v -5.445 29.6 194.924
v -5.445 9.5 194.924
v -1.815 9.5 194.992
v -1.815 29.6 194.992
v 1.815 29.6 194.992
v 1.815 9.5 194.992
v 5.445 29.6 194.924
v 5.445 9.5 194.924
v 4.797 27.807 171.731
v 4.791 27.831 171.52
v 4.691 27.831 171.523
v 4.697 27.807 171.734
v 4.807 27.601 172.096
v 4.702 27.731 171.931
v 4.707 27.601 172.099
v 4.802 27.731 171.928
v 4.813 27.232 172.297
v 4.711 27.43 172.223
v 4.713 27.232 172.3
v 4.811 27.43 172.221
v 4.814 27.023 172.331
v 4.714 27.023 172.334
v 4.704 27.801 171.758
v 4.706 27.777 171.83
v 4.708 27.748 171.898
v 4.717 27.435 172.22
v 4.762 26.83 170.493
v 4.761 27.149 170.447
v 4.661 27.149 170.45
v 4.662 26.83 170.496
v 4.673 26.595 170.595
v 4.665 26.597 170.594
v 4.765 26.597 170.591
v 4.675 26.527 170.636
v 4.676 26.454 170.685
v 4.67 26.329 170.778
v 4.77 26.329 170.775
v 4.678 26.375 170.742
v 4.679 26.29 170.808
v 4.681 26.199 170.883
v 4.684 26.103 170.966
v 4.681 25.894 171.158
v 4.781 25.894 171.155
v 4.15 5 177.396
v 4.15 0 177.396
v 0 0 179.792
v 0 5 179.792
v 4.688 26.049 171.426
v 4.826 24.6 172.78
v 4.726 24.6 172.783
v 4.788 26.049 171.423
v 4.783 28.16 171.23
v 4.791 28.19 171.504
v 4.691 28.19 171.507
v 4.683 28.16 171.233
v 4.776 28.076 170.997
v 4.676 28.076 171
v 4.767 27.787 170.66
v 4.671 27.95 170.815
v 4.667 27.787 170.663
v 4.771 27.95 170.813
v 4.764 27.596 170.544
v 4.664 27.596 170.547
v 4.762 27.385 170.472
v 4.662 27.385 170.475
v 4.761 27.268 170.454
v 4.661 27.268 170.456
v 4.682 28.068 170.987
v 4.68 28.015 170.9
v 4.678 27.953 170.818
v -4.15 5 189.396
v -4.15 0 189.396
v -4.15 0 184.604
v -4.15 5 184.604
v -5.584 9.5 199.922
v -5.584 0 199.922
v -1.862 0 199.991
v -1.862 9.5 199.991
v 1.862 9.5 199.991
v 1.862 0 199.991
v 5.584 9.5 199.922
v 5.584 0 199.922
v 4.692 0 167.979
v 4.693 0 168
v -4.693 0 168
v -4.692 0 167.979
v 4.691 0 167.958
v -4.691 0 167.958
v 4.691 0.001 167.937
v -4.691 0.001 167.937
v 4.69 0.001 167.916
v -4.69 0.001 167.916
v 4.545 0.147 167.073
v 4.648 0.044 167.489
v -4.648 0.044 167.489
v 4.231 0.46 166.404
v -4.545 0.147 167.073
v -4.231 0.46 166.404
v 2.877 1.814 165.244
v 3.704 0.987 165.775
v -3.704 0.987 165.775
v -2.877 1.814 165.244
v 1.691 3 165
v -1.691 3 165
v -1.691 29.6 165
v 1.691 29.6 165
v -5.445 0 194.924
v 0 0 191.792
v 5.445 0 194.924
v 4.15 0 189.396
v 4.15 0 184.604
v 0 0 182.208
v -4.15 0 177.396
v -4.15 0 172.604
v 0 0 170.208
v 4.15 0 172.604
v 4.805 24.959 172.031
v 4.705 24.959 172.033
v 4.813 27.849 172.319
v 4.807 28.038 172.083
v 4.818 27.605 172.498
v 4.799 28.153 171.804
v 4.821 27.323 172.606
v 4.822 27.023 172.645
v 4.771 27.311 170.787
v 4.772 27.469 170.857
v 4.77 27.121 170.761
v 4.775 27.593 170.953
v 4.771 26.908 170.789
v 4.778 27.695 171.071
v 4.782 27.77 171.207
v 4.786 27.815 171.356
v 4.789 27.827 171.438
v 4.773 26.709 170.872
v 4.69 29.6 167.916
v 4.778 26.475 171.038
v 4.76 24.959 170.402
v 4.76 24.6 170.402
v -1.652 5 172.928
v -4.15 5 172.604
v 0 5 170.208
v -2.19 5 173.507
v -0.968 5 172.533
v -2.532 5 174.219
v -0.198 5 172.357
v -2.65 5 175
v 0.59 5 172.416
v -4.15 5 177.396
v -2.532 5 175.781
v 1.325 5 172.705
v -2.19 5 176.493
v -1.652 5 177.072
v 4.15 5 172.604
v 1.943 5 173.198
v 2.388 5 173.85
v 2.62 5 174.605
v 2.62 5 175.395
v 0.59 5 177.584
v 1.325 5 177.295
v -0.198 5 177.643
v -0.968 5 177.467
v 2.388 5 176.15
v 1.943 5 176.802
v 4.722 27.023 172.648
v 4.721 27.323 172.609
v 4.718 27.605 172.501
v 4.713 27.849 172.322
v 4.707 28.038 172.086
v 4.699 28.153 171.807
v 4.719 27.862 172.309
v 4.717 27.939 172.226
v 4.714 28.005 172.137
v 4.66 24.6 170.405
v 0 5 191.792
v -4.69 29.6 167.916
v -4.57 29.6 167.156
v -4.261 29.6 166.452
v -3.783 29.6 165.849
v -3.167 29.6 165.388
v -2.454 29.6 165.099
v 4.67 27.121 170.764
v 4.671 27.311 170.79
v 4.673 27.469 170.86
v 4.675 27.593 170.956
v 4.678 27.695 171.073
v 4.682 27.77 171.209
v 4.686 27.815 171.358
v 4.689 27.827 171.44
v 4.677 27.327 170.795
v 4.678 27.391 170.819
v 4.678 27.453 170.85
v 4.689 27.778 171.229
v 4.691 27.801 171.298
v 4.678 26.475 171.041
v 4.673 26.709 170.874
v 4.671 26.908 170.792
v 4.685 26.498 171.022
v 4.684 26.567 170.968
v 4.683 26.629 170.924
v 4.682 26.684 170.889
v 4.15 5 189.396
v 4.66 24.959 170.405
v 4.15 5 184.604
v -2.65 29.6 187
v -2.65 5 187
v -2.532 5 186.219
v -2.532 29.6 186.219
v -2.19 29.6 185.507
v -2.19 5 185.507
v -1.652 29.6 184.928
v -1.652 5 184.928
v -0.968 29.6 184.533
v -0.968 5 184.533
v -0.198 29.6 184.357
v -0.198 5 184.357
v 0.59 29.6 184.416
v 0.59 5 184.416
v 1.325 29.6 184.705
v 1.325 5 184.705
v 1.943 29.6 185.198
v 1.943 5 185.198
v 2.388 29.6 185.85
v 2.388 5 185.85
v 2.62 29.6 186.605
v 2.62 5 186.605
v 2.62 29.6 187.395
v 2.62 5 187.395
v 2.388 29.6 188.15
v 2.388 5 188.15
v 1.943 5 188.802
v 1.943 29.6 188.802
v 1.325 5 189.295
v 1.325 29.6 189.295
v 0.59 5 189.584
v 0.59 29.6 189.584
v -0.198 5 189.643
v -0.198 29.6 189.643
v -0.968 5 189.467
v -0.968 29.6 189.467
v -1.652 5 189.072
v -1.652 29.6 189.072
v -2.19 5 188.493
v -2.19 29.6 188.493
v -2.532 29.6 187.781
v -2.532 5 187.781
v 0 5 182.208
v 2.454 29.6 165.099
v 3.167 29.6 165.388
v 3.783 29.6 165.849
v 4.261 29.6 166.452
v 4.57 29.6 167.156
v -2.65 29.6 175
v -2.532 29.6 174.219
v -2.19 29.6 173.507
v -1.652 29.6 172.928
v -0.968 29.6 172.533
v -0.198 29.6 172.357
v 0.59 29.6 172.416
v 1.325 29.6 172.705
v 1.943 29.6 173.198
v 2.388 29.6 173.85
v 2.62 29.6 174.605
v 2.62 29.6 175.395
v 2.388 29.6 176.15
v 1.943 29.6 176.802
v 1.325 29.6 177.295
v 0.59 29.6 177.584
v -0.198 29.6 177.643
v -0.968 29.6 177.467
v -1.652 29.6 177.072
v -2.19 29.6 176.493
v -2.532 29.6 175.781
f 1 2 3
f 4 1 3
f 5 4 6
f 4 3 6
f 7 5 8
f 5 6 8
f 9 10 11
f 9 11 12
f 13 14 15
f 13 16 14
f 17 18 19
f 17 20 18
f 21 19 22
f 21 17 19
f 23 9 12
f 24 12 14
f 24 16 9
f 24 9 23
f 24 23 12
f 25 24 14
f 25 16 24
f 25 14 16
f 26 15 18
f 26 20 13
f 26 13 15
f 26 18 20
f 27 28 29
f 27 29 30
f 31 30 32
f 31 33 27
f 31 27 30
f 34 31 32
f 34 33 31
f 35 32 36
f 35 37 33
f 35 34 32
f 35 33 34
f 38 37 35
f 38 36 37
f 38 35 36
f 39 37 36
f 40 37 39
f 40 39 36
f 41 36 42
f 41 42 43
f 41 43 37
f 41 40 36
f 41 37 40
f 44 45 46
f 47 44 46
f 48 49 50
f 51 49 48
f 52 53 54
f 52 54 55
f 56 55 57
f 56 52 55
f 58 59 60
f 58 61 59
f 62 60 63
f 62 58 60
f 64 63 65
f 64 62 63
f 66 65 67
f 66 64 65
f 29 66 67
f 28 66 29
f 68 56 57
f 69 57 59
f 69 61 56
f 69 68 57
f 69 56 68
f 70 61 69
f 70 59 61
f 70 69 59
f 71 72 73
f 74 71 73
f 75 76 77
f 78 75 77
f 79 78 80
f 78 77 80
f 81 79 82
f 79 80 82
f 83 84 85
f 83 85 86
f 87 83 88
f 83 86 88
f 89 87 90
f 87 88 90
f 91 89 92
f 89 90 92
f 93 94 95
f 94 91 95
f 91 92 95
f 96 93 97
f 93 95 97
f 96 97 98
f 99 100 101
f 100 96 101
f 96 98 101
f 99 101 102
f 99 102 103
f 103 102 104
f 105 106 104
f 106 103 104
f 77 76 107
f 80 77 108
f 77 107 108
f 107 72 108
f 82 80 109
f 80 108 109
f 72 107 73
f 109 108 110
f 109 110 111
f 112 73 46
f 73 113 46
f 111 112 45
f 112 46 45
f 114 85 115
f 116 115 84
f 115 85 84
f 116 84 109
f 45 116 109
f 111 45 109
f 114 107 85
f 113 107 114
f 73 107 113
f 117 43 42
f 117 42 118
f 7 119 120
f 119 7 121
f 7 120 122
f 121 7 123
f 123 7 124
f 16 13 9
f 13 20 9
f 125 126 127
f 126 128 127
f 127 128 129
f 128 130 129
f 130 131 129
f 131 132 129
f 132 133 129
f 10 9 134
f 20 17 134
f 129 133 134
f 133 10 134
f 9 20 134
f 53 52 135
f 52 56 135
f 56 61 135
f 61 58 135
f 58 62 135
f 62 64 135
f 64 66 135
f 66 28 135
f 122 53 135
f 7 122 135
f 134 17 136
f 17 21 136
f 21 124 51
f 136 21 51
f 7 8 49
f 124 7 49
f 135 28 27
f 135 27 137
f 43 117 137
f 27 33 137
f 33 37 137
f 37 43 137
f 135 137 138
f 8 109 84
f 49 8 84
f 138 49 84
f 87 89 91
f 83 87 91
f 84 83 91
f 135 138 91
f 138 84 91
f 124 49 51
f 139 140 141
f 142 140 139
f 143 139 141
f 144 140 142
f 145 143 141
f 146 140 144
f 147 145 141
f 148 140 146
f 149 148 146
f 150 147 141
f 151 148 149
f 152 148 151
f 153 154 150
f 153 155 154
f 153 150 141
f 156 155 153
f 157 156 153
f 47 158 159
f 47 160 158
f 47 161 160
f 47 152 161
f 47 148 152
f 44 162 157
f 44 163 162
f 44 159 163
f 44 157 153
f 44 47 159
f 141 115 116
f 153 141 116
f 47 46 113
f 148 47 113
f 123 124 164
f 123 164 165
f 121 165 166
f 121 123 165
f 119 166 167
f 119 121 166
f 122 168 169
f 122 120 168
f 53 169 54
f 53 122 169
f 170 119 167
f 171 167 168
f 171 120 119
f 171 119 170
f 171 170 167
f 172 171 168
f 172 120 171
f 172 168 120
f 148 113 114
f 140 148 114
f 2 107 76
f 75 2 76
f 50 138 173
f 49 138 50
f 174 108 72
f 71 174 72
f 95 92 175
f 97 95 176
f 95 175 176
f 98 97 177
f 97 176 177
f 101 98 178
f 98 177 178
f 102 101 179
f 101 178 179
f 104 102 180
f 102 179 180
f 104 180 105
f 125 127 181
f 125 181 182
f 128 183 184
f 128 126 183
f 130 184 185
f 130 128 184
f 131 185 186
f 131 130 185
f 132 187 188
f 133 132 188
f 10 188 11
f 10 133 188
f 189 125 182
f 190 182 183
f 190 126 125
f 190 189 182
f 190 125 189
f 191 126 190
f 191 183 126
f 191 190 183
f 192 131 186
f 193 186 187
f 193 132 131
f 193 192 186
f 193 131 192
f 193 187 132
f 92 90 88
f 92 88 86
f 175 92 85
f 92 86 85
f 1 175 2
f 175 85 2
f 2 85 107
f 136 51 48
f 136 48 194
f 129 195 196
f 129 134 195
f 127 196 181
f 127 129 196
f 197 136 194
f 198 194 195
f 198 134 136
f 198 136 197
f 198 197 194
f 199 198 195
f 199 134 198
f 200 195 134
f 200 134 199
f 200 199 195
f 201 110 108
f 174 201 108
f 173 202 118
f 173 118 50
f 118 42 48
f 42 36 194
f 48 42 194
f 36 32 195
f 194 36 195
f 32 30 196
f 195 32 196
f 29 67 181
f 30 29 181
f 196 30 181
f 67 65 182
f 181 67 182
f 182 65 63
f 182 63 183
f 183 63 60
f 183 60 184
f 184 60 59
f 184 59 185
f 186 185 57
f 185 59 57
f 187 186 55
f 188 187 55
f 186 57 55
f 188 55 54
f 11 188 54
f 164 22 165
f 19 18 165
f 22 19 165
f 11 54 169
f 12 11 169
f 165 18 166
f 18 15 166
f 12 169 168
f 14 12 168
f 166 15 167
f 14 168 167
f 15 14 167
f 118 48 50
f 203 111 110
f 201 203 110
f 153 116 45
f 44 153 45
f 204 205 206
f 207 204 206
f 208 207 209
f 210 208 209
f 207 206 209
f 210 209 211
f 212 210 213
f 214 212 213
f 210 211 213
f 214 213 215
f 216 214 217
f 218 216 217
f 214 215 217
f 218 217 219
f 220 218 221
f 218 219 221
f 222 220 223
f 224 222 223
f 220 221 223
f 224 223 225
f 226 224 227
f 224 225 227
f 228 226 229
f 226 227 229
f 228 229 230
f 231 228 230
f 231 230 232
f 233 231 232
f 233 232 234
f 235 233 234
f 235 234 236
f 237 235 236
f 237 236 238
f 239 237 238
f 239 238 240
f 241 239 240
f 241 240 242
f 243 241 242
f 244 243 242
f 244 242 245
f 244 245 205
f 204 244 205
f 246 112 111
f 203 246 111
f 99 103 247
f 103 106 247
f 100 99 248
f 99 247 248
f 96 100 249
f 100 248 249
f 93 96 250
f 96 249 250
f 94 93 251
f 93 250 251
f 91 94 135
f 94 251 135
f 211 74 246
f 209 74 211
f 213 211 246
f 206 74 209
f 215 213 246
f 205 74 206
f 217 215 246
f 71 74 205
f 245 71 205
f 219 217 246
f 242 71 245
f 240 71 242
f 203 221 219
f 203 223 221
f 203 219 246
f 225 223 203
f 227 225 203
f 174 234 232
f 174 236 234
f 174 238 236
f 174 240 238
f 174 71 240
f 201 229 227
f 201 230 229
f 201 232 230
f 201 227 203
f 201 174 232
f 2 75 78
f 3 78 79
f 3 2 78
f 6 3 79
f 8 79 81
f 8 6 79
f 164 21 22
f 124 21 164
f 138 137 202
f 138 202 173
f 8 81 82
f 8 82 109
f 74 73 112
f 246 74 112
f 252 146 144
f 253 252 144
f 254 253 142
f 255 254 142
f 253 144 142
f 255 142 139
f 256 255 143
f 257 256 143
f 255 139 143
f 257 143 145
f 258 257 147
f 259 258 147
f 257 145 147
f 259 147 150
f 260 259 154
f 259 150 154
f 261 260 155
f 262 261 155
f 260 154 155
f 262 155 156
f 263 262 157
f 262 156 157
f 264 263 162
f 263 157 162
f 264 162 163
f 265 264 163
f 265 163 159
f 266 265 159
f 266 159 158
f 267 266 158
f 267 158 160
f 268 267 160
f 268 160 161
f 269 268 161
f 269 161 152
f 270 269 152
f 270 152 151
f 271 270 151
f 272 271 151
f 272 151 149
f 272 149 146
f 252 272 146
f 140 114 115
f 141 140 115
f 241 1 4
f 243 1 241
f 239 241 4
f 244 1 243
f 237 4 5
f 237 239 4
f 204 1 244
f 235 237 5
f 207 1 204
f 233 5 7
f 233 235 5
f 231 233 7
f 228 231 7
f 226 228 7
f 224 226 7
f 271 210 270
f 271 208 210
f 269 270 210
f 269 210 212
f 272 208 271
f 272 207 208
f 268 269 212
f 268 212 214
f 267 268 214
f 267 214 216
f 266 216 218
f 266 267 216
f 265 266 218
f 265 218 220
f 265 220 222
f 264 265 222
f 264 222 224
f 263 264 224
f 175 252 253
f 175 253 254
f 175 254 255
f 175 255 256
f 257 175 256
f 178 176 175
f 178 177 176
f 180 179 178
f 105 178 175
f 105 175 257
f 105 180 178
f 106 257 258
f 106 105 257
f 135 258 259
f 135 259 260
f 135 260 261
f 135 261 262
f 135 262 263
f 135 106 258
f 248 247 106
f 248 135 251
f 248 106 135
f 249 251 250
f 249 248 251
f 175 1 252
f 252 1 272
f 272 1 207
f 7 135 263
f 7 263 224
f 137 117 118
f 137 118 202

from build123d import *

# Parameters (mm, degrees)
EXTRUDE_590_DEPTH   = 29.6
EXTRUDE_638_DEPTH   = 9.5
FILLET_1_R          = 3
HOLE_WIZARD_M5_1_D  = 5.3
CUT_EXTRUDE_1_DEPTH = 5
CUT_EXTRUDE_2_DEPTH = 0.1


with BuildPart() as part:
    # 草图1 → Extrude 590 (new body)
    with BuildSketch(Plane(origin=(0, 0, 0), x_dir=(1, 0, 0), z_dir=(0, 1, 0))):
        with BuildLine():
            Line((4.608867317, -165), (-4.608867317, -165))
            Line((-4.608867317, -165), (-5.444719551, -194.923972433))
            ThreePointArc((-5.444719551, -194.923972433), (0, -195), (5.444719551, -194.923972433))
            Line((5.444719551, -194.923972433), (4.608867317, -165))
        make_face()
    extrude(amount=EXTRUDE_590_DEPTH)

    # 草图1<3> → Extrude 638 (add)
    with BuildSketch(Plane(origin=(0, 0, 0), x_dir=(1, 0, 0), z_dir=(0, 1, 0))):
        with BuildLine():
            ThreePointArc((5.444719551, -194.923972433), (0, -195), (-5.444719551, -194.923972433))
            Line((-5.444719551, -194.923972433), (-5.584327745, -199.922023008))
            ThreePointArc((-5.584327745, -199.922023008), (0, -200), (5.584327745, -199.922023008))
            Line((5.584327745, -199.922023008), (5.444719551, -194.923972433))
        make_face()
    extrude(amount=EXTRUDE_638_DEPTH)

    # 圆角1
    fillet_1_edges = [part.edges().sort_by_distance(p)[0] for p in [
        (0, 0, 165),
        (-4.608867317, 14.8, 165),
        (4.608867317, 14.8, 165),
    ]]
    fillet(fillet_1_edges, radius=FILLET_1_R)

    # M5 间隙孔1 (through all)
    with Locations(Plane(origin=(0, 29.6, 0), x_dir=(1, 0, 0), z_dir=(0, 1, 0))):
        with Locations((0, -187), (0, -175)):
            Hole(HOLE_WIZARD_M5_1_D / 2)

    # 草图6 → 切除-拉伸1 (cut)
    with BuildSketch(Plane.XZ):
        Polygon((0, 179.792007234), (-4.15, 177.396003617), (-4.15, 172.603996383), (0, 170.207992766), (4.15, 172.603996383), (4.15, 177.396003617), align=None)
        Polygon((0, 191.792007234), (-4.15, 189.396003617), (-4.15, 184.603996383), (0, 182.207992766), (4.15, 184.603996383), (4.15, 189.396003617), align=None)
    extrude(amount=-CUT_EXTRUDE_1_DEPTH, mode=Mode.SUBTRACT)

    # 草图7 → 切除-拉伸2 (cut)
    with BuildSketch(Plane(origin=(0, 0, 0), x_dir=(-0.02792163872356911, 0, -0.9996101150403545), z_dir=(0.9996101150403545, 0, -0.02792163872356911))):
        with BuildLine():
            Line((-172.3983953, 27.023076923), (-172.712497864, 27.023076923))
            add(Edge.make_bspline(
                [(-172.712497864, 27.023076923), (-172.710450711, 27.064747811), (-172.706430157, 27.146588325), (-172.687601868, 27.265912232), (-172.660660991, 27.379967031), (-172.622569537, 27.487836945), (-172.575263259, 27.590475752), (-172.518533231, 27.687475767), (-172.451339381, 27.778466956), (-172.375132647, 27.862605799), (-172.292364008, 27.93979337), (-172.203058068, 28.006448613), (-172.109213041, 28.062766284), (-172.011113642, 28.109847526), (-171.907653079, 28.145187372), (-171.799770221, 28.171409012), (-171.686991084, 28.187185357), (-171.610151062, 28.188881143), (-171.571071582, 28.18974359)],
                knots=[0, 0, 0, 0, 1.10065271, 2.161652631, 3.183658789, 4.190468796, 5.17591951, 6.163126047, 7.15150782, 8.156236427, 9.156009102, 10.134482811, 11.092018607, 12.041330605, 13.001268258, 13.972401359, 14.968799086, 16, 16, 16, 16], degree=3))
            add(Edge.make_bspline(
                [(-171.571071582, 28.18974359), (-171.532693508, 28.188845133), (-171.457281963, 28.187079698), (-171.347219949, 28.171918669), (-171.242442654, 28.148173078), (-171.143154888, 28.114857661), (-171.050148823, 28.070073234), (-170.962725779, 28.016275695), (-170.879844968, 27.954055864), (-170.805238184, 27.88080205), (-170.736730105, 27.802599666), (-170.67762785, 27.719111762), (-170.627014686, 27.632882477), (-170.584827007, 27.543254275), (-170.553770868, 27.449383247), (-170.53019266, 27.352636044), (-170.516865246, 27.252011233), (-170.514819822, 27.183904677), (-170.513779915, 27.149278846)],
                knots=[0, 0, 0, 0, 1.111607364, 2.184268762, 3.212621178, 4.221274766, 5.211760367, 6.196651075, 7.1921475, 8.207485113, 9.220403448, 10.201281604, 11.166441695, 12.114753415, 13.065576456, 14.026450734, 14.996634279, 16, 16, 16, 16], degree=3))
            add(Edge.make_bspline(
                [(-170.513779915, 27.149278846), (-170.515473178, 27.100531012), (-170.51882999, 27.003890798), (-170.547544366, 26.861875935), (-170.592390877, 26.724282516), (-170.646388234, 26.613545214), (-170.700860678, 26.52431172), (-170.749948186, 26.450843015), (-170.807412997, 26.371737547), (-170.874091495, 26.28726021), (-170.948604367, 26.196749304), (-171.03162653, 26.100259509), (-171.123750012, 25.998787739), (-171.188408513, 25.929482138), (-171.221912928, 25.893569712)],
                knots=[0, 0, 0, 0, 1.184426356, 2.348067706, 3.509069118, 4.696110526, 5.333549288, 6.050745305, 6.844228056, 7.710549037, 8.667450064, 9.695053472, 10.805634456, 12, 12, 12, 12], degree=3))
            Line((-171.221912928, 25.893569712), (-172.09761405, 24.958974359))
            Line((-172.09761405, 24.958974359), (-170.46890812, 24.958974359))
            Line((-170.46890812, 24.958974359), (-170.46890812, 24.6))
            Line((-170.46890812, 24.6), (-172.847113249, 24.6))
            Line((-172.847113249, 24.6), (-171.489741454, 26.048517628))
            add(Edge.make_bspline(
                [(-171.489741454, 26.048517628), (-171.456693567, 26.083015935), (-171.39321534, 26.149280121), (-171.303432763, 26.246023081), (-171.222793775, 26.335772622), (-171.150776382, 26.418359171), (-171.088942877, 26.494990738), (-171.034070645, 26.563185442), (-170.990105054, 26.625939892), (-170.942389658, 26.698680506), (-170.896175677, 26.787492823), (-170.856463321, 26.896026513), (-170.832248472, 27.007753765), (-170.829343637, 27.083255802), (-170.827882479, 27.121233974)],
                knots=[0, 0, 0, 0, 1.329631726, 2.553950428, 3.673215718, 4.687767853, 5.603093632, 6.413772471, 7.123043292, 7.734684054, 8.834405432, 9.900288307, 10.943827018, 12, 12, 12, 12], degree=3))
            add(Edge.make_bspline(
                [(-170.827882479, 27.121233974), (-170.828518222, 27.145115373), (-170.829771148, 27.192181023), (-170.840828845, 27.261186782), (-170.857539351, 27.327751596), (-170.881484609, 27.392080215), (-170.913091349, 27.453525867), (-170.951564729, 27.512163347), (-170.995954793, 27.568852313), (-171.047306062, 27.622005611), (-171.103717582, 27.670686816), (-171.163311832, 27.713810902), (-171.226361936, 27.749850012), (-171.292602058, 27.779393509), (-171.361847527, 27.802568891), (-171.434232273, 27.81862747), (-171.509556289, 27.828709954), (-171.560989784, 27.830074126), (-171.587197383, 27.830769231)],
                knots=[0, 0, 0, 0, 0.991446411, 1.95395049, 2.89581595, 3.838931463, 4.798493298, 5.75982156, 6.748411868, 7.785213223, 8.824556874, 9.840280684, 10.836137867, 11.835679398, 12.848801643, 13.863922112, 14.911575587, 16, 16, 16, 16], degree=3))
            add(Edge.make_bspline(
                [(-171.587197383, 27.830769231), (-171.614568216, 27.830054199), (-171.668320012, 27.828649993), (-171.747239045, 27.818827329), (-171.822524823, 27.801881489), (-171.894366726, 27.778704814), (-171.962886312, 27.749246266), (-172.027750356, 27.712554521), (-172.088813245, 27.668771028), (-172.146189768, 27.619130471), (-172.199053747, 27.56386287), (-172.245500623, 27.502252907), (-172.286084637, 27.435425492), (-172.321493871, 27.363560941), (-172.350249561, 27.286007161), (-172.372222711, 27.203039456), (-172.389609558, 27.115018075), (-172.395418079, 27.05423299), (-172.3983953, 27.023076923)],
                knots=[0, 0, 0, 0, 1.031018746, 2.02475058, 2.990194455, 3.934040569, 4.864654155, 5.795059489, 6.735614925, 7.690564532, 8.649604399, 9.611025574, 10.590972636, 11.591080095, 12.624614302, 13.701020113, 14.821632451, 16, 16, 16, 16], degree=3))
        make_face()
    extrude(amount=-CUT_EXTRUDE_2_DEPTH, mode=Mode.SUBTRACT)


solid = part.part
